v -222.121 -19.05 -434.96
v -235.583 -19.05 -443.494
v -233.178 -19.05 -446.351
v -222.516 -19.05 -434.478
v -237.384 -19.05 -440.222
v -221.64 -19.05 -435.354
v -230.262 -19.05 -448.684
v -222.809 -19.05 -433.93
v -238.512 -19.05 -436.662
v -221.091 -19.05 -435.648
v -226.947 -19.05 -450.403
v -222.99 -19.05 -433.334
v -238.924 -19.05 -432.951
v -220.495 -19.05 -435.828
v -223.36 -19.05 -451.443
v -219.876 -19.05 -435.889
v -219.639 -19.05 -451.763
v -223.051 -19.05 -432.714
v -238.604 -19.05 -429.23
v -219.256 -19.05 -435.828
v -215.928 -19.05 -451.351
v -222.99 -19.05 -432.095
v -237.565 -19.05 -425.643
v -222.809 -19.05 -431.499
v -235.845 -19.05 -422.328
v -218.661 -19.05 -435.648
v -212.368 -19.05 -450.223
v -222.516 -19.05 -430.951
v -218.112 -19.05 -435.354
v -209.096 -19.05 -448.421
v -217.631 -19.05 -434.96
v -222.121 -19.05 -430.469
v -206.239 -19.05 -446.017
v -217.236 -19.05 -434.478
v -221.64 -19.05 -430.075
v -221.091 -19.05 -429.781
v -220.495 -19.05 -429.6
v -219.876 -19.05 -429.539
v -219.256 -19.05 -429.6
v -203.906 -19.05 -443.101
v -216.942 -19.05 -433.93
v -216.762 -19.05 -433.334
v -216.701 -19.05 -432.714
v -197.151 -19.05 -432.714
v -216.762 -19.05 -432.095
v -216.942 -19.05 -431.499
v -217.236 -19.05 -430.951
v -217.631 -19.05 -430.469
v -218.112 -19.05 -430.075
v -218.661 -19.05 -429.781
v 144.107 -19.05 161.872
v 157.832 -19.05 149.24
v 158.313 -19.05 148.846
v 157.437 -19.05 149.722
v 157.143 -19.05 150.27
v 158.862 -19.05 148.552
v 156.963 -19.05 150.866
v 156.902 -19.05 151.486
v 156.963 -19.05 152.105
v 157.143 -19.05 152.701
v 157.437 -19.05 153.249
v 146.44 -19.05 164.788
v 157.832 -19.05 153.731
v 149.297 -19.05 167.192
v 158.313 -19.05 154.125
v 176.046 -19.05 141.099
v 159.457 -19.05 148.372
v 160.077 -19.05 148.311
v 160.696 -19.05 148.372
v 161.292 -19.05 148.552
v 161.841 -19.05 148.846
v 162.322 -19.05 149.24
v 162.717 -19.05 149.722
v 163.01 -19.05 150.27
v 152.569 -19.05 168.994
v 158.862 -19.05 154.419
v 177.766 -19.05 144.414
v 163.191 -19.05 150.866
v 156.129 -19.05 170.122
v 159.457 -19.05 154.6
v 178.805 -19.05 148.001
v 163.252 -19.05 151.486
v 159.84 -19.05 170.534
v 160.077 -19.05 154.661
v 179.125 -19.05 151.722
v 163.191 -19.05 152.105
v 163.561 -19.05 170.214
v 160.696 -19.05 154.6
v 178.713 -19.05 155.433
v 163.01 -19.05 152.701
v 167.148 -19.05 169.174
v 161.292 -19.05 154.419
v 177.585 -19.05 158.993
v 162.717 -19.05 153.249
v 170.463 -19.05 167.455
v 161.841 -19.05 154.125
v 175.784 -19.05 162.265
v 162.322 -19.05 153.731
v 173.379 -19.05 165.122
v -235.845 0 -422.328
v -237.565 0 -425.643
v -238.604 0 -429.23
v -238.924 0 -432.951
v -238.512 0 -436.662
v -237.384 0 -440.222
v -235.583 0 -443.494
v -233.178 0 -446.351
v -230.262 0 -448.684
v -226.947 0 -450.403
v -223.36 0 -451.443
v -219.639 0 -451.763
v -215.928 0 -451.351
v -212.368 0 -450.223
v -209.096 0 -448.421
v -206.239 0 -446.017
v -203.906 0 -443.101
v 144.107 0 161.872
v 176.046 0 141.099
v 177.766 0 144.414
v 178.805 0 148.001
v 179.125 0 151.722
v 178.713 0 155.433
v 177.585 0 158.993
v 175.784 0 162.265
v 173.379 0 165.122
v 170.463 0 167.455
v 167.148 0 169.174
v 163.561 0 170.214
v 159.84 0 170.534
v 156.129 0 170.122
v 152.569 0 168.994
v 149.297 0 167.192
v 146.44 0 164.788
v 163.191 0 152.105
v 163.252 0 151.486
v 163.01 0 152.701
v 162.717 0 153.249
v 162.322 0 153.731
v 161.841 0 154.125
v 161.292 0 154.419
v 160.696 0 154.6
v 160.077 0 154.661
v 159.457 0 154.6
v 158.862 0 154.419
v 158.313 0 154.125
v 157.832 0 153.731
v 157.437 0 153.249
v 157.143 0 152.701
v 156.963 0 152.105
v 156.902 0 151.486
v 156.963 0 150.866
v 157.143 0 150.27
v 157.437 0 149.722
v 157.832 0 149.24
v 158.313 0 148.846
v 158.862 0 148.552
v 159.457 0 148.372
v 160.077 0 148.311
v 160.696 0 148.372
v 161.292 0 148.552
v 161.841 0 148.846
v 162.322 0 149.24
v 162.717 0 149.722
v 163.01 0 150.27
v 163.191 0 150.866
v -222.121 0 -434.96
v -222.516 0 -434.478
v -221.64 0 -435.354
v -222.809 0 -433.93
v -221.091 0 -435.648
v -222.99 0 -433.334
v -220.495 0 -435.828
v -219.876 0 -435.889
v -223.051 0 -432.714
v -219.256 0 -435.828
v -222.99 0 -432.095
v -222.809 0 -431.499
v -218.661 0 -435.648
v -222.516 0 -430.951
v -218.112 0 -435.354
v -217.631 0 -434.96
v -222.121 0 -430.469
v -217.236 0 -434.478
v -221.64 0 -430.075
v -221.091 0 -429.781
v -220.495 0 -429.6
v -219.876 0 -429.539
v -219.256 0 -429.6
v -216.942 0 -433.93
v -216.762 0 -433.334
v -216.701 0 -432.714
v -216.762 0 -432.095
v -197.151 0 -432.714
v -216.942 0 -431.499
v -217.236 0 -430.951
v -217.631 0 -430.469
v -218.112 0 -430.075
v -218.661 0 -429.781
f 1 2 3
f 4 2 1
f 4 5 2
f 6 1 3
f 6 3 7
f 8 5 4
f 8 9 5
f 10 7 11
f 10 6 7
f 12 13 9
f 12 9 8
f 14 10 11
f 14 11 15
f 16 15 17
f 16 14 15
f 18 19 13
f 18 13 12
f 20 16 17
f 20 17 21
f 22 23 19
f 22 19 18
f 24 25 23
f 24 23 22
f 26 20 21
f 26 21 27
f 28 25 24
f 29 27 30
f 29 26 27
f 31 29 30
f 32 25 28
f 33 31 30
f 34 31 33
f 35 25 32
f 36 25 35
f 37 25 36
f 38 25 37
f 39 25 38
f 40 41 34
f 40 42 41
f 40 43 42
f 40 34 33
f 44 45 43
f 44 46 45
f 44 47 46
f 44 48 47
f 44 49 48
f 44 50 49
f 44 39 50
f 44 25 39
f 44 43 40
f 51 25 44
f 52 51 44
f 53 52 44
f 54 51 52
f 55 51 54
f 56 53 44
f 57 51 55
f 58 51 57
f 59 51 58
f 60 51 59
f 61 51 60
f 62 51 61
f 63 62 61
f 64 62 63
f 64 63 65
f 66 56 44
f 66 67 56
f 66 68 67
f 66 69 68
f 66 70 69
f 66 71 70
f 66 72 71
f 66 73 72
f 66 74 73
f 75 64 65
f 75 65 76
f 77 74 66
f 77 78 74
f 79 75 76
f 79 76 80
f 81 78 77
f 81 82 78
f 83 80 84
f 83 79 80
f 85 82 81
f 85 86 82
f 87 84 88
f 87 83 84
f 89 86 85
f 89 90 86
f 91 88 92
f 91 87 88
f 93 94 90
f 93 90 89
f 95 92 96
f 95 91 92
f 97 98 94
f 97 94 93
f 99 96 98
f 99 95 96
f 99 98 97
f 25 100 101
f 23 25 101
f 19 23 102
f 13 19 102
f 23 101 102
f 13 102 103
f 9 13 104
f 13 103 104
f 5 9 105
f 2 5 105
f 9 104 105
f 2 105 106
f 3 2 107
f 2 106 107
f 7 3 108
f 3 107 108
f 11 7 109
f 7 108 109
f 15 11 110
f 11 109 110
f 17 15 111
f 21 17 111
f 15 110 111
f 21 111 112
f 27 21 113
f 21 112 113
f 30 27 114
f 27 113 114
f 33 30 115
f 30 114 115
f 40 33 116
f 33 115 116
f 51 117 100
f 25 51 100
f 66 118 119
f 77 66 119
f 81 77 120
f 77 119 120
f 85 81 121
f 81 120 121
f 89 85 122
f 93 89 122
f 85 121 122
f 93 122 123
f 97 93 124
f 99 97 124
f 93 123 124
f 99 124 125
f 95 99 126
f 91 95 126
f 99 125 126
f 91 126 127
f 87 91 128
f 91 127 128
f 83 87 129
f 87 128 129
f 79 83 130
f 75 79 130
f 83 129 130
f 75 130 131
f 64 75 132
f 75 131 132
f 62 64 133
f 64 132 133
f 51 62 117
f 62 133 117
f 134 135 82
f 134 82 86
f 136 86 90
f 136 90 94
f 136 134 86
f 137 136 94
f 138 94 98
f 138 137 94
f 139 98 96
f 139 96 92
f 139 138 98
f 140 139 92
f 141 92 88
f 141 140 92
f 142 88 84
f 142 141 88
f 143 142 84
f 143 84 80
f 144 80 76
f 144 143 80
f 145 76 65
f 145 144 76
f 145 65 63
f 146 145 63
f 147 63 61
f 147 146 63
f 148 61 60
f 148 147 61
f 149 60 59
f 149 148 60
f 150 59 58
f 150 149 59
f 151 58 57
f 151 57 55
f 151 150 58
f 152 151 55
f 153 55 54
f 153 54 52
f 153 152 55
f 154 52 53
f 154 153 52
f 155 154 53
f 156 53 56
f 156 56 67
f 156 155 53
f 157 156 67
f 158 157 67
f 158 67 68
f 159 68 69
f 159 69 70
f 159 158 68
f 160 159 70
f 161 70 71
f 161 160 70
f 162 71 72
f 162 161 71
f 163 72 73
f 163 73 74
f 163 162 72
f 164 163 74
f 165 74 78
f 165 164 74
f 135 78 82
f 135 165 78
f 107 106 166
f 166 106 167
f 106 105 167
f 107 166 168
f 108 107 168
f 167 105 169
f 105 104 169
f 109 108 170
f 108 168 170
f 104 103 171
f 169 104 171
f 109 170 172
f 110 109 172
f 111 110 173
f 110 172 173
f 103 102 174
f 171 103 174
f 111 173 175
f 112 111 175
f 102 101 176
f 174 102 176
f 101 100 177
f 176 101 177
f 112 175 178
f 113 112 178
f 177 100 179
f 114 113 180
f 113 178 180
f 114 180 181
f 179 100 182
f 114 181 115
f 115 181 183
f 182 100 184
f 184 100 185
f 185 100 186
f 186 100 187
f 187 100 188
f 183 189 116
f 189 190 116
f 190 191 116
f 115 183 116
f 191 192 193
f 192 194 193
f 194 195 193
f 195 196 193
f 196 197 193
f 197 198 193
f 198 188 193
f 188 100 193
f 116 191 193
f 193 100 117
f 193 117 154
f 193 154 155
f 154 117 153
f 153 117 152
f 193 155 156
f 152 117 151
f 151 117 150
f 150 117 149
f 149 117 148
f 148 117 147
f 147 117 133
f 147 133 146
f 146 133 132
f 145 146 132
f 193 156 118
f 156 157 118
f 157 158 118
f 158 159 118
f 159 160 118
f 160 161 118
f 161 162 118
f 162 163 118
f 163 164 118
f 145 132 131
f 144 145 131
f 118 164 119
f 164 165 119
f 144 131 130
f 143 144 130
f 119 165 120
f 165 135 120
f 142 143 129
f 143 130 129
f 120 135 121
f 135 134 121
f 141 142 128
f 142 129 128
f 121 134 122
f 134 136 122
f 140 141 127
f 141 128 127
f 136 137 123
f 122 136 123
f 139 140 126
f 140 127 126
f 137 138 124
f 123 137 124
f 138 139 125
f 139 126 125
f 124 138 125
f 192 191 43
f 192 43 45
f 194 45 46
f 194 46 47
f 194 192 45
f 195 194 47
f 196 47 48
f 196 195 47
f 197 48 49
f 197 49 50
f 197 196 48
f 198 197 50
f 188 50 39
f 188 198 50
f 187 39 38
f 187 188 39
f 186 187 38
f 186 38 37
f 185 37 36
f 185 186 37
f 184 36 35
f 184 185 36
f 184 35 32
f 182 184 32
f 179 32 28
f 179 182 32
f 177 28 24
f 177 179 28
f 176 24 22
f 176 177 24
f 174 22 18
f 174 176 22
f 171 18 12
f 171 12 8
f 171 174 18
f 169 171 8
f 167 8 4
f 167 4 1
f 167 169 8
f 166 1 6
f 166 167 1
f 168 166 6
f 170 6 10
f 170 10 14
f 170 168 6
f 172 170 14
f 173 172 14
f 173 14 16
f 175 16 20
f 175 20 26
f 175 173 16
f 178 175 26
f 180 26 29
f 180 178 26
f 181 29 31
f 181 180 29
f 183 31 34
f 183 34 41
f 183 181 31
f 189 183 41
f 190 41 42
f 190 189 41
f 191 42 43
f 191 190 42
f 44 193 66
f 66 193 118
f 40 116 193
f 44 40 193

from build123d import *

# Parameters (mm, degrees)
F0_R     = 3.175
F1_DEPTH = 19.05


with BuildPart() as f1:
    # F0 (on Front) → F1 (new body)
    with BuildSketch(Plane.XZ):
        with BuildLine():
            Line((-203.9060870256, -443.1007931722), (-197.1510368857, -432.7144915486))
            Line((-197.1510368857, -432.7144915486), (176.0463190104, 141.0992068278))
            ThreePointArc((176.0463190104, 141.0992068278), (170.463048361, 167.4550807244), (144.1071744644, 161.871810075))
            Line((144.1071744644, 161.871810075), (-235.8452315716, -422.328189925))
            ThreePointArc((-235.8452315716, -422.328189925), (-230.2619609222, -448.6840638216), (-203.9060870256, -443.1007931722))
        make_face()
        with Locations((-219.8756592986, -432.7144915486)):
            Circle(F0_R, mode=Mode.SUBTRACT)
        with Locations((160.0767467374, 151.4855084514)):
            Circle(F0_R, mode=Mode.SUBTRACT)
    extrude(amount=F1_DEPTH)


solid = f1.part
